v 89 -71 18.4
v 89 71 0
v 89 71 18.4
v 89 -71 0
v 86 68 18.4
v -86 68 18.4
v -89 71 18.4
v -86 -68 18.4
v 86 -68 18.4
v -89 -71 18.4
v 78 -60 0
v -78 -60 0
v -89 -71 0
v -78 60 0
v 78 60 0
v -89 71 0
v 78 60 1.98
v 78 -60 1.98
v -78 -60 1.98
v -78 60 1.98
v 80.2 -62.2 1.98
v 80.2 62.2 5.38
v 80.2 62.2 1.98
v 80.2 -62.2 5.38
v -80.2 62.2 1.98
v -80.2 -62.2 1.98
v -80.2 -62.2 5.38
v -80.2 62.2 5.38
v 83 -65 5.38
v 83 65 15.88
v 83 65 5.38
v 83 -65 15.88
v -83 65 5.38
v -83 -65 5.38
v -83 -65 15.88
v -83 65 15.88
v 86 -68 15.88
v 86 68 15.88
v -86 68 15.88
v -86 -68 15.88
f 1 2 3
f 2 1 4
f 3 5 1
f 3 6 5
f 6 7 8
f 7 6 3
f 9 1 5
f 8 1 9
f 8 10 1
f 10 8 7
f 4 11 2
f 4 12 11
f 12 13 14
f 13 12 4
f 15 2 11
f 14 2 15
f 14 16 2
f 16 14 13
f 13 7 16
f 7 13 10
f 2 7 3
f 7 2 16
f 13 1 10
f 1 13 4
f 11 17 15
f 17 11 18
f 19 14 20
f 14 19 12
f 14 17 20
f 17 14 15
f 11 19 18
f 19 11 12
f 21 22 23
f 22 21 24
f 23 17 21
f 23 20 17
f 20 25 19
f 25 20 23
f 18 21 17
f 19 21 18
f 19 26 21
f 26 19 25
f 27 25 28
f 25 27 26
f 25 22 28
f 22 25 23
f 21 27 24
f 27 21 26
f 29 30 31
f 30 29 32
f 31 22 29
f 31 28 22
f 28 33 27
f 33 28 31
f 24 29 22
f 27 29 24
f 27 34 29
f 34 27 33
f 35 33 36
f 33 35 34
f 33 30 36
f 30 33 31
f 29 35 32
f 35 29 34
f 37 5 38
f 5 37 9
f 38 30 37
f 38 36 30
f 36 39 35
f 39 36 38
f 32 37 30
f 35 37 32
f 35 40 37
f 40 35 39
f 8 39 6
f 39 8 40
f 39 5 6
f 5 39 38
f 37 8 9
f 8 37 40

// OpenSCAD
// Caixa paramétrica para litofania 160 x 124 x 3 mm.
// Conceito V5 aprovado; espessura LED e tomada USB medidas pelo utilizador.
// Imprimir body com a frente em Z=0; lid com a face plana em Z=0.

part = "body"; // body, lid, assembly
$fn = 48;

// Elementos medidos e dimensões propostas (mm)
litho_w = 160;
litho_h = 124;
litho_t = 3;
outer_w = 178;
outer_h = 142;
front_window_w = 156;
front_window_h = 120;
front_lip_t = 2;
litho_xy_clearance = 0.2; // por lado
litho_z_clearance = 0.4;
inner_w = 166;
inner_h = 130;
rear_seat_w = 172;
rear_seat_h = 136;
rear_seat_depth = 2.5;
rear_lid_xy_clearance = 0.2; // por lado
rear_lid_t = 2.4;
light_gap = 15; // verso da litofania ate face emissora do LED
led_total_thickness = 2.04; // LED fica pelo EXTERIOR da tampa
led_standoff = 2; // eleva a porta USB acima da lateral inteiramente fechada
led_window_w = 150;
led_window_h = 114;
led_board_w = 156; // anunciado; confirmar fisicamente
led_board_h = 120.1; // medido aproximadamente

// A USB-C esta no centro da extremidade curta do PCB, lado direito.
usb_port_w = 8.88; // largura exterior da tomada medida
usb_port_h = 3.04; // altura exterior da tomada medida
usb_notch_width_y = 20; // reserva para o corpo da FICHA, ainda nao medido
usb_notch_start_x = 76; // relativo ao centro da placa

litho_pocket_w = litho_w + 2*litho_xy_clearance;
litho_pocket_h = litho_h + 2*litho_xy_clearance;
litho_pocket_d = litho_t + litho_z_clearance;
panel_back_z = front_lip_t + litho_pocket_d;
body_depth = panel_back_z + light_gap - led_standoff;
seat_start_z = body_depth - rear_seat_depth;
rear_lid_w = rear_seat_w - 2*rear_lid_xy_clearance;
rear_lid_h = rear_seat_h - 2*rear_lid_xy_clearance;
eps = 0.02;

module body() {
    difference() {
        translate([-outer_w/2, -outer_h/2, 0])
            cube([outer_w, outer_h, body_depth]);
        // Janela frontal: frente impressa sobre o prato.
        translate([-front_window_w/2, -front_window_h/2, -eps])
            cube([front_window_w, front_window_h, front_lip_t+2*eps]);
        // Assento da litofania, inserida pelas costas.
        translate([-litho_pocket_w/2, -litho_pocket_h/2, front_lip_t-eps])
            cube([litho_pocket_w, litho_pocket_h, litho_pocket_d+2*eps]);
        // Camara luminosa. Litofania colada na margem escondida, sem aro.
        translate([-inner_w/2, -inner_h/2, panel_back_z-eps])
            cube([inner_w, inner_h, seat_start_z-panel_back_z+2*eps]);
        // Rebaixo posterior: deixa uma aba de apoio de 3 mm.
        translate([-rear_seat_w/2, -rear_seat_h/2, seat_start_z-eps])
            cube([rear_seat_w, rear_seat_h, rear_seat_depth+2*eps]);
        // O corpo NAO tem qualquer abertura lateral.
    }
}

module lid() {
    difference() {
        union() {
            translate([-rear_lid_w/2, -rear_lid_h/2, 0])
                cube([rear_lid_w, rear_lid_h, rear_lid_t]);
            // Aba saliente no EXTERIOR da tampa. O LED cola-se na margem
            // frontal nao luminosa da placa, com a face luminosa para dentro.
            translate([-led_board_w/2, -led_board_h/2, rear_lid_t])
                cube([led_board_w, led_board_h, led_standoff]);
        }
        // Grande janela deixa passar a luz para a litofania.
        translate([-led_window_w/2, -led_window_h/2, -eps])
            cube([led_window_w, led_window_h, rear_lid_t+led_standoff+2*eps]);
        // Recorte apenas na TAMPA; a porta fica atras do plano do corpo.
        translate([usb_notch_start_x, -usb_notch_width_y/2, -eps])
            cube([rear_lid_w/2-usb_notch_start_x+eps, usb_notch_width_y,
                  rear_lid_t+led_standoff+2*eps]);
    }
}

if (part == "body") body();
else if (part == "lid") lid();
else if (part == "assembly") {
    color("#303d49") body();
    color("#e4d9ba") translate([0,0,front_lip_t+litho_t/2])
        cube([litho_w, litho_h, litho_t], center=true);
    color("#dbe4e9") translate([0,0,seat_start_z]) lid();
}
